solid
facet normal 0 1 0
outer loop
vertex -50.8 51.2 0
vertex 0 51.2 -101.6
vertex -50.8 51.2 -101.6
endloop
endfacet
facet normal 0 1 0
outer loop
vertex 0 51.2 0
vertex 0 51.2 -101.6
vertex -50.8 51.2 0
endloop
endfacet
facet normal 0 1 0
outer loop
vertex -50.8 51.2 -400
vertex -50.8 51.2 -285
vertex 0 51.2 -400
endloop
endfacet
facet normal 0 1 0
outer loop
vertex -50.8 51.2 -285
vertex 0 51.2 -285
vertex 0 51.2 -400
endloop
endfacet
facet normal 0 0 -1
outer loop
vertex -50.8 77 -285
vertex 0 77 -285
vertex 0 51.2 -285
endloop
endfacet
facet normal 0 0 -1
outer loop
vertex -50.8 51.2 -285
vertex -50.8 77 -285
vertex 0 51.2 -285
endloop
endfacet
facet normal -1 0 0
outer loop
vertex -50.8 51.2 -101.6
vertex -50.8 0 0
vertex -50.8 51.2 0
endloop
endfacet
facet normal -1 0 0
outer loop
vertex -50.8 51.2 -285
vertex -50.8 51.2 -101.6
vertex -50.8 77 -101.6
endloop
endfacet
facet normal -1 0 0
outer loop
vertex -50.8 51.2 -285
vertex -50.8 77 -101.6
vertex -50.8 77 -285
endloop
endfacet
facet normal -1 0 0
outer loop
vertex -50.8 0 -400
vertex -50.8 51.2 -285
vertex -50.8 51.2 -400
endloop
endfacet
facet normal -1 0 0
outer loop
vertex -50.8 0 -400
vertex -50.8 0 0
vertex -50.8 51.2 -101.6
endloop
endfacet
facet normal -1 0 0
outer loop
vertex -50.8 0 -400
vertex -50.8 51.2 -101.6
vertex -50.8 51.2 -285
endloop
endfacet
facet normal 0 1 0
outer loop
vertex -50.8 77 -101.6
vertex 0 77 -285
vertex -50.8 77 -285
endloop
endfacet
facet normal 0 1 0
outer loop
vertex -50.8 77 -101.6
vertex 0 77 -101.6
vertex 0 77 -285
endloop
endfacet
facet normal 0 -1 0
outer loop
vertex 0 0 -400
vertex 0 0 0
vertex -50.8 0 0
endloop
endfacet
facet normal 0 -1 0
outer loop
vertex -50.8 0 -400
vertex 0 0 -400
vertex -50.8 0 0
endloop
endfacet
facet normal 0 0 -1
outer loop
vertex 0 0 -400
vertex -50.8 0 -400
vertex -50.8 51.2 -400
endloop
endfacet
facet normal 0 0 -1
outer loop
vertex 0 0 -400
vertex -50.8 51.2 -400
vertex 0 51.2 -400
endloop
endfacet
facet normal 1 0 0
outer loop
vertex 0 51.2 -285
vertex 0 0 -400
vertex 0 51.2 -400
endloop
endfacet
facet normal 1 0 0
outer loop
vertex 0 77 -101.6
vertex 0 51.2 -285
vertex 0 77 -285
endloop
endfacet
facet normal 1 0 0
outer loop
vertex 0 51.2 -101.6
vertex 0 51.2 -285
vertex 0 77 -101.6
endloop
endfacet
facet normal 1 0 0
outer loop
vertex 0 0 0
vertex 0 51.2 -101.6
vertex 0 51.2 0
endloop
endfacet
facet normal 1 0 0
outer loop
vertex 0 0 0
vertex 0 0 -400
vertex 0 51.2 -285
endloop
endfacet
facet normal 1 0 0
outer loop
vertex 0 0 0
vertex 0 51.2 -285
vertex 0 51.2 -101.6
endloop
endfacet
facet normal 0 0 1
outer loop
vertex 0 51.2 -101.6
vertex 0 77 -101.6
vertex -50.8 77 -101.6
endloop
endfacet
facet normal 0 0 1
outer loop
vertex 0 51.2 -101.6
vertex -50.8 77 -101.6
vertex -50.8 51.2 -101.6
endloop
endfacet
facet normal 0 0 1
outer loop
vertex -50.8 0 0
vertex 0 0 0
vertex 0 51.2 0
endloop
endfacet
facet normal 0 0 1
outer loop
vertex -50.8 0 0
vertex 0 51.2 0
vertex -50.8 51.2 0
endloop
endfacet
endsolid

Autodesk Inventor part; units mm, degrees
ref_plane "YZ Plane" through (0, 0, 0) normal (1, 0, 0) x (0, 1, 0)
ref_plane "XZ Plane" through (0, 0, 0) normal (0, 1, 0) x (-1, 0, 0)
ref_plane "XY Plane" through (0, 0, 0) normal (0, 0, 1) x (1, 0, 0)
sketch "Sketch1" plane through (0, 0, 0) normal (0, 1, 0) x (-1, 0, 0)
  line L0 (0, 0) -> (50.8, 0)
  line L1 (50.8, 0) -> (50.8, -400)
  line L2 (50.8, -400) -> (0, -400)
  line L3 (0, -400) -> (0, 0)
  dimension "d0" = 50.8
  dimension "d1" = 400
extrude "Extrusion1" add sketch "Sketch1" along normal blind 77
sketch "Sketch3" plane through (0, 0, 0) normal (1, 0, 0) x (0, 0, -1)
  line L0 (0, 77) -> (101.6, 77)
  line L1 (101.6, 77) -> (101.6, 51.2)
  line L2 (101.6, 51.2) -> (0, 51.2)
  line L3 (0, 51.2) -> (0, 77)
  line L4 (0, 77) -> (400, 77) projected
  line L5 (400, 77) -> (285, 77)
  line L6 (285, 77) -> (285, 51.2)
  line L7 (285, 51.2) -> (400, 51.2)
  line L8 (400, 51.2) -> (400, 77)
  point P0 (0, 0)
  dimension "d8" = 101.6
  dimension "d9" = 25.8
  dimension "d10" = 115
  dimension "d11" = 25.8
extrude "Extrusion2" cut sketch "Sketch3" against normal blind 50.8
properties part number "PiezaPuerta-1"
